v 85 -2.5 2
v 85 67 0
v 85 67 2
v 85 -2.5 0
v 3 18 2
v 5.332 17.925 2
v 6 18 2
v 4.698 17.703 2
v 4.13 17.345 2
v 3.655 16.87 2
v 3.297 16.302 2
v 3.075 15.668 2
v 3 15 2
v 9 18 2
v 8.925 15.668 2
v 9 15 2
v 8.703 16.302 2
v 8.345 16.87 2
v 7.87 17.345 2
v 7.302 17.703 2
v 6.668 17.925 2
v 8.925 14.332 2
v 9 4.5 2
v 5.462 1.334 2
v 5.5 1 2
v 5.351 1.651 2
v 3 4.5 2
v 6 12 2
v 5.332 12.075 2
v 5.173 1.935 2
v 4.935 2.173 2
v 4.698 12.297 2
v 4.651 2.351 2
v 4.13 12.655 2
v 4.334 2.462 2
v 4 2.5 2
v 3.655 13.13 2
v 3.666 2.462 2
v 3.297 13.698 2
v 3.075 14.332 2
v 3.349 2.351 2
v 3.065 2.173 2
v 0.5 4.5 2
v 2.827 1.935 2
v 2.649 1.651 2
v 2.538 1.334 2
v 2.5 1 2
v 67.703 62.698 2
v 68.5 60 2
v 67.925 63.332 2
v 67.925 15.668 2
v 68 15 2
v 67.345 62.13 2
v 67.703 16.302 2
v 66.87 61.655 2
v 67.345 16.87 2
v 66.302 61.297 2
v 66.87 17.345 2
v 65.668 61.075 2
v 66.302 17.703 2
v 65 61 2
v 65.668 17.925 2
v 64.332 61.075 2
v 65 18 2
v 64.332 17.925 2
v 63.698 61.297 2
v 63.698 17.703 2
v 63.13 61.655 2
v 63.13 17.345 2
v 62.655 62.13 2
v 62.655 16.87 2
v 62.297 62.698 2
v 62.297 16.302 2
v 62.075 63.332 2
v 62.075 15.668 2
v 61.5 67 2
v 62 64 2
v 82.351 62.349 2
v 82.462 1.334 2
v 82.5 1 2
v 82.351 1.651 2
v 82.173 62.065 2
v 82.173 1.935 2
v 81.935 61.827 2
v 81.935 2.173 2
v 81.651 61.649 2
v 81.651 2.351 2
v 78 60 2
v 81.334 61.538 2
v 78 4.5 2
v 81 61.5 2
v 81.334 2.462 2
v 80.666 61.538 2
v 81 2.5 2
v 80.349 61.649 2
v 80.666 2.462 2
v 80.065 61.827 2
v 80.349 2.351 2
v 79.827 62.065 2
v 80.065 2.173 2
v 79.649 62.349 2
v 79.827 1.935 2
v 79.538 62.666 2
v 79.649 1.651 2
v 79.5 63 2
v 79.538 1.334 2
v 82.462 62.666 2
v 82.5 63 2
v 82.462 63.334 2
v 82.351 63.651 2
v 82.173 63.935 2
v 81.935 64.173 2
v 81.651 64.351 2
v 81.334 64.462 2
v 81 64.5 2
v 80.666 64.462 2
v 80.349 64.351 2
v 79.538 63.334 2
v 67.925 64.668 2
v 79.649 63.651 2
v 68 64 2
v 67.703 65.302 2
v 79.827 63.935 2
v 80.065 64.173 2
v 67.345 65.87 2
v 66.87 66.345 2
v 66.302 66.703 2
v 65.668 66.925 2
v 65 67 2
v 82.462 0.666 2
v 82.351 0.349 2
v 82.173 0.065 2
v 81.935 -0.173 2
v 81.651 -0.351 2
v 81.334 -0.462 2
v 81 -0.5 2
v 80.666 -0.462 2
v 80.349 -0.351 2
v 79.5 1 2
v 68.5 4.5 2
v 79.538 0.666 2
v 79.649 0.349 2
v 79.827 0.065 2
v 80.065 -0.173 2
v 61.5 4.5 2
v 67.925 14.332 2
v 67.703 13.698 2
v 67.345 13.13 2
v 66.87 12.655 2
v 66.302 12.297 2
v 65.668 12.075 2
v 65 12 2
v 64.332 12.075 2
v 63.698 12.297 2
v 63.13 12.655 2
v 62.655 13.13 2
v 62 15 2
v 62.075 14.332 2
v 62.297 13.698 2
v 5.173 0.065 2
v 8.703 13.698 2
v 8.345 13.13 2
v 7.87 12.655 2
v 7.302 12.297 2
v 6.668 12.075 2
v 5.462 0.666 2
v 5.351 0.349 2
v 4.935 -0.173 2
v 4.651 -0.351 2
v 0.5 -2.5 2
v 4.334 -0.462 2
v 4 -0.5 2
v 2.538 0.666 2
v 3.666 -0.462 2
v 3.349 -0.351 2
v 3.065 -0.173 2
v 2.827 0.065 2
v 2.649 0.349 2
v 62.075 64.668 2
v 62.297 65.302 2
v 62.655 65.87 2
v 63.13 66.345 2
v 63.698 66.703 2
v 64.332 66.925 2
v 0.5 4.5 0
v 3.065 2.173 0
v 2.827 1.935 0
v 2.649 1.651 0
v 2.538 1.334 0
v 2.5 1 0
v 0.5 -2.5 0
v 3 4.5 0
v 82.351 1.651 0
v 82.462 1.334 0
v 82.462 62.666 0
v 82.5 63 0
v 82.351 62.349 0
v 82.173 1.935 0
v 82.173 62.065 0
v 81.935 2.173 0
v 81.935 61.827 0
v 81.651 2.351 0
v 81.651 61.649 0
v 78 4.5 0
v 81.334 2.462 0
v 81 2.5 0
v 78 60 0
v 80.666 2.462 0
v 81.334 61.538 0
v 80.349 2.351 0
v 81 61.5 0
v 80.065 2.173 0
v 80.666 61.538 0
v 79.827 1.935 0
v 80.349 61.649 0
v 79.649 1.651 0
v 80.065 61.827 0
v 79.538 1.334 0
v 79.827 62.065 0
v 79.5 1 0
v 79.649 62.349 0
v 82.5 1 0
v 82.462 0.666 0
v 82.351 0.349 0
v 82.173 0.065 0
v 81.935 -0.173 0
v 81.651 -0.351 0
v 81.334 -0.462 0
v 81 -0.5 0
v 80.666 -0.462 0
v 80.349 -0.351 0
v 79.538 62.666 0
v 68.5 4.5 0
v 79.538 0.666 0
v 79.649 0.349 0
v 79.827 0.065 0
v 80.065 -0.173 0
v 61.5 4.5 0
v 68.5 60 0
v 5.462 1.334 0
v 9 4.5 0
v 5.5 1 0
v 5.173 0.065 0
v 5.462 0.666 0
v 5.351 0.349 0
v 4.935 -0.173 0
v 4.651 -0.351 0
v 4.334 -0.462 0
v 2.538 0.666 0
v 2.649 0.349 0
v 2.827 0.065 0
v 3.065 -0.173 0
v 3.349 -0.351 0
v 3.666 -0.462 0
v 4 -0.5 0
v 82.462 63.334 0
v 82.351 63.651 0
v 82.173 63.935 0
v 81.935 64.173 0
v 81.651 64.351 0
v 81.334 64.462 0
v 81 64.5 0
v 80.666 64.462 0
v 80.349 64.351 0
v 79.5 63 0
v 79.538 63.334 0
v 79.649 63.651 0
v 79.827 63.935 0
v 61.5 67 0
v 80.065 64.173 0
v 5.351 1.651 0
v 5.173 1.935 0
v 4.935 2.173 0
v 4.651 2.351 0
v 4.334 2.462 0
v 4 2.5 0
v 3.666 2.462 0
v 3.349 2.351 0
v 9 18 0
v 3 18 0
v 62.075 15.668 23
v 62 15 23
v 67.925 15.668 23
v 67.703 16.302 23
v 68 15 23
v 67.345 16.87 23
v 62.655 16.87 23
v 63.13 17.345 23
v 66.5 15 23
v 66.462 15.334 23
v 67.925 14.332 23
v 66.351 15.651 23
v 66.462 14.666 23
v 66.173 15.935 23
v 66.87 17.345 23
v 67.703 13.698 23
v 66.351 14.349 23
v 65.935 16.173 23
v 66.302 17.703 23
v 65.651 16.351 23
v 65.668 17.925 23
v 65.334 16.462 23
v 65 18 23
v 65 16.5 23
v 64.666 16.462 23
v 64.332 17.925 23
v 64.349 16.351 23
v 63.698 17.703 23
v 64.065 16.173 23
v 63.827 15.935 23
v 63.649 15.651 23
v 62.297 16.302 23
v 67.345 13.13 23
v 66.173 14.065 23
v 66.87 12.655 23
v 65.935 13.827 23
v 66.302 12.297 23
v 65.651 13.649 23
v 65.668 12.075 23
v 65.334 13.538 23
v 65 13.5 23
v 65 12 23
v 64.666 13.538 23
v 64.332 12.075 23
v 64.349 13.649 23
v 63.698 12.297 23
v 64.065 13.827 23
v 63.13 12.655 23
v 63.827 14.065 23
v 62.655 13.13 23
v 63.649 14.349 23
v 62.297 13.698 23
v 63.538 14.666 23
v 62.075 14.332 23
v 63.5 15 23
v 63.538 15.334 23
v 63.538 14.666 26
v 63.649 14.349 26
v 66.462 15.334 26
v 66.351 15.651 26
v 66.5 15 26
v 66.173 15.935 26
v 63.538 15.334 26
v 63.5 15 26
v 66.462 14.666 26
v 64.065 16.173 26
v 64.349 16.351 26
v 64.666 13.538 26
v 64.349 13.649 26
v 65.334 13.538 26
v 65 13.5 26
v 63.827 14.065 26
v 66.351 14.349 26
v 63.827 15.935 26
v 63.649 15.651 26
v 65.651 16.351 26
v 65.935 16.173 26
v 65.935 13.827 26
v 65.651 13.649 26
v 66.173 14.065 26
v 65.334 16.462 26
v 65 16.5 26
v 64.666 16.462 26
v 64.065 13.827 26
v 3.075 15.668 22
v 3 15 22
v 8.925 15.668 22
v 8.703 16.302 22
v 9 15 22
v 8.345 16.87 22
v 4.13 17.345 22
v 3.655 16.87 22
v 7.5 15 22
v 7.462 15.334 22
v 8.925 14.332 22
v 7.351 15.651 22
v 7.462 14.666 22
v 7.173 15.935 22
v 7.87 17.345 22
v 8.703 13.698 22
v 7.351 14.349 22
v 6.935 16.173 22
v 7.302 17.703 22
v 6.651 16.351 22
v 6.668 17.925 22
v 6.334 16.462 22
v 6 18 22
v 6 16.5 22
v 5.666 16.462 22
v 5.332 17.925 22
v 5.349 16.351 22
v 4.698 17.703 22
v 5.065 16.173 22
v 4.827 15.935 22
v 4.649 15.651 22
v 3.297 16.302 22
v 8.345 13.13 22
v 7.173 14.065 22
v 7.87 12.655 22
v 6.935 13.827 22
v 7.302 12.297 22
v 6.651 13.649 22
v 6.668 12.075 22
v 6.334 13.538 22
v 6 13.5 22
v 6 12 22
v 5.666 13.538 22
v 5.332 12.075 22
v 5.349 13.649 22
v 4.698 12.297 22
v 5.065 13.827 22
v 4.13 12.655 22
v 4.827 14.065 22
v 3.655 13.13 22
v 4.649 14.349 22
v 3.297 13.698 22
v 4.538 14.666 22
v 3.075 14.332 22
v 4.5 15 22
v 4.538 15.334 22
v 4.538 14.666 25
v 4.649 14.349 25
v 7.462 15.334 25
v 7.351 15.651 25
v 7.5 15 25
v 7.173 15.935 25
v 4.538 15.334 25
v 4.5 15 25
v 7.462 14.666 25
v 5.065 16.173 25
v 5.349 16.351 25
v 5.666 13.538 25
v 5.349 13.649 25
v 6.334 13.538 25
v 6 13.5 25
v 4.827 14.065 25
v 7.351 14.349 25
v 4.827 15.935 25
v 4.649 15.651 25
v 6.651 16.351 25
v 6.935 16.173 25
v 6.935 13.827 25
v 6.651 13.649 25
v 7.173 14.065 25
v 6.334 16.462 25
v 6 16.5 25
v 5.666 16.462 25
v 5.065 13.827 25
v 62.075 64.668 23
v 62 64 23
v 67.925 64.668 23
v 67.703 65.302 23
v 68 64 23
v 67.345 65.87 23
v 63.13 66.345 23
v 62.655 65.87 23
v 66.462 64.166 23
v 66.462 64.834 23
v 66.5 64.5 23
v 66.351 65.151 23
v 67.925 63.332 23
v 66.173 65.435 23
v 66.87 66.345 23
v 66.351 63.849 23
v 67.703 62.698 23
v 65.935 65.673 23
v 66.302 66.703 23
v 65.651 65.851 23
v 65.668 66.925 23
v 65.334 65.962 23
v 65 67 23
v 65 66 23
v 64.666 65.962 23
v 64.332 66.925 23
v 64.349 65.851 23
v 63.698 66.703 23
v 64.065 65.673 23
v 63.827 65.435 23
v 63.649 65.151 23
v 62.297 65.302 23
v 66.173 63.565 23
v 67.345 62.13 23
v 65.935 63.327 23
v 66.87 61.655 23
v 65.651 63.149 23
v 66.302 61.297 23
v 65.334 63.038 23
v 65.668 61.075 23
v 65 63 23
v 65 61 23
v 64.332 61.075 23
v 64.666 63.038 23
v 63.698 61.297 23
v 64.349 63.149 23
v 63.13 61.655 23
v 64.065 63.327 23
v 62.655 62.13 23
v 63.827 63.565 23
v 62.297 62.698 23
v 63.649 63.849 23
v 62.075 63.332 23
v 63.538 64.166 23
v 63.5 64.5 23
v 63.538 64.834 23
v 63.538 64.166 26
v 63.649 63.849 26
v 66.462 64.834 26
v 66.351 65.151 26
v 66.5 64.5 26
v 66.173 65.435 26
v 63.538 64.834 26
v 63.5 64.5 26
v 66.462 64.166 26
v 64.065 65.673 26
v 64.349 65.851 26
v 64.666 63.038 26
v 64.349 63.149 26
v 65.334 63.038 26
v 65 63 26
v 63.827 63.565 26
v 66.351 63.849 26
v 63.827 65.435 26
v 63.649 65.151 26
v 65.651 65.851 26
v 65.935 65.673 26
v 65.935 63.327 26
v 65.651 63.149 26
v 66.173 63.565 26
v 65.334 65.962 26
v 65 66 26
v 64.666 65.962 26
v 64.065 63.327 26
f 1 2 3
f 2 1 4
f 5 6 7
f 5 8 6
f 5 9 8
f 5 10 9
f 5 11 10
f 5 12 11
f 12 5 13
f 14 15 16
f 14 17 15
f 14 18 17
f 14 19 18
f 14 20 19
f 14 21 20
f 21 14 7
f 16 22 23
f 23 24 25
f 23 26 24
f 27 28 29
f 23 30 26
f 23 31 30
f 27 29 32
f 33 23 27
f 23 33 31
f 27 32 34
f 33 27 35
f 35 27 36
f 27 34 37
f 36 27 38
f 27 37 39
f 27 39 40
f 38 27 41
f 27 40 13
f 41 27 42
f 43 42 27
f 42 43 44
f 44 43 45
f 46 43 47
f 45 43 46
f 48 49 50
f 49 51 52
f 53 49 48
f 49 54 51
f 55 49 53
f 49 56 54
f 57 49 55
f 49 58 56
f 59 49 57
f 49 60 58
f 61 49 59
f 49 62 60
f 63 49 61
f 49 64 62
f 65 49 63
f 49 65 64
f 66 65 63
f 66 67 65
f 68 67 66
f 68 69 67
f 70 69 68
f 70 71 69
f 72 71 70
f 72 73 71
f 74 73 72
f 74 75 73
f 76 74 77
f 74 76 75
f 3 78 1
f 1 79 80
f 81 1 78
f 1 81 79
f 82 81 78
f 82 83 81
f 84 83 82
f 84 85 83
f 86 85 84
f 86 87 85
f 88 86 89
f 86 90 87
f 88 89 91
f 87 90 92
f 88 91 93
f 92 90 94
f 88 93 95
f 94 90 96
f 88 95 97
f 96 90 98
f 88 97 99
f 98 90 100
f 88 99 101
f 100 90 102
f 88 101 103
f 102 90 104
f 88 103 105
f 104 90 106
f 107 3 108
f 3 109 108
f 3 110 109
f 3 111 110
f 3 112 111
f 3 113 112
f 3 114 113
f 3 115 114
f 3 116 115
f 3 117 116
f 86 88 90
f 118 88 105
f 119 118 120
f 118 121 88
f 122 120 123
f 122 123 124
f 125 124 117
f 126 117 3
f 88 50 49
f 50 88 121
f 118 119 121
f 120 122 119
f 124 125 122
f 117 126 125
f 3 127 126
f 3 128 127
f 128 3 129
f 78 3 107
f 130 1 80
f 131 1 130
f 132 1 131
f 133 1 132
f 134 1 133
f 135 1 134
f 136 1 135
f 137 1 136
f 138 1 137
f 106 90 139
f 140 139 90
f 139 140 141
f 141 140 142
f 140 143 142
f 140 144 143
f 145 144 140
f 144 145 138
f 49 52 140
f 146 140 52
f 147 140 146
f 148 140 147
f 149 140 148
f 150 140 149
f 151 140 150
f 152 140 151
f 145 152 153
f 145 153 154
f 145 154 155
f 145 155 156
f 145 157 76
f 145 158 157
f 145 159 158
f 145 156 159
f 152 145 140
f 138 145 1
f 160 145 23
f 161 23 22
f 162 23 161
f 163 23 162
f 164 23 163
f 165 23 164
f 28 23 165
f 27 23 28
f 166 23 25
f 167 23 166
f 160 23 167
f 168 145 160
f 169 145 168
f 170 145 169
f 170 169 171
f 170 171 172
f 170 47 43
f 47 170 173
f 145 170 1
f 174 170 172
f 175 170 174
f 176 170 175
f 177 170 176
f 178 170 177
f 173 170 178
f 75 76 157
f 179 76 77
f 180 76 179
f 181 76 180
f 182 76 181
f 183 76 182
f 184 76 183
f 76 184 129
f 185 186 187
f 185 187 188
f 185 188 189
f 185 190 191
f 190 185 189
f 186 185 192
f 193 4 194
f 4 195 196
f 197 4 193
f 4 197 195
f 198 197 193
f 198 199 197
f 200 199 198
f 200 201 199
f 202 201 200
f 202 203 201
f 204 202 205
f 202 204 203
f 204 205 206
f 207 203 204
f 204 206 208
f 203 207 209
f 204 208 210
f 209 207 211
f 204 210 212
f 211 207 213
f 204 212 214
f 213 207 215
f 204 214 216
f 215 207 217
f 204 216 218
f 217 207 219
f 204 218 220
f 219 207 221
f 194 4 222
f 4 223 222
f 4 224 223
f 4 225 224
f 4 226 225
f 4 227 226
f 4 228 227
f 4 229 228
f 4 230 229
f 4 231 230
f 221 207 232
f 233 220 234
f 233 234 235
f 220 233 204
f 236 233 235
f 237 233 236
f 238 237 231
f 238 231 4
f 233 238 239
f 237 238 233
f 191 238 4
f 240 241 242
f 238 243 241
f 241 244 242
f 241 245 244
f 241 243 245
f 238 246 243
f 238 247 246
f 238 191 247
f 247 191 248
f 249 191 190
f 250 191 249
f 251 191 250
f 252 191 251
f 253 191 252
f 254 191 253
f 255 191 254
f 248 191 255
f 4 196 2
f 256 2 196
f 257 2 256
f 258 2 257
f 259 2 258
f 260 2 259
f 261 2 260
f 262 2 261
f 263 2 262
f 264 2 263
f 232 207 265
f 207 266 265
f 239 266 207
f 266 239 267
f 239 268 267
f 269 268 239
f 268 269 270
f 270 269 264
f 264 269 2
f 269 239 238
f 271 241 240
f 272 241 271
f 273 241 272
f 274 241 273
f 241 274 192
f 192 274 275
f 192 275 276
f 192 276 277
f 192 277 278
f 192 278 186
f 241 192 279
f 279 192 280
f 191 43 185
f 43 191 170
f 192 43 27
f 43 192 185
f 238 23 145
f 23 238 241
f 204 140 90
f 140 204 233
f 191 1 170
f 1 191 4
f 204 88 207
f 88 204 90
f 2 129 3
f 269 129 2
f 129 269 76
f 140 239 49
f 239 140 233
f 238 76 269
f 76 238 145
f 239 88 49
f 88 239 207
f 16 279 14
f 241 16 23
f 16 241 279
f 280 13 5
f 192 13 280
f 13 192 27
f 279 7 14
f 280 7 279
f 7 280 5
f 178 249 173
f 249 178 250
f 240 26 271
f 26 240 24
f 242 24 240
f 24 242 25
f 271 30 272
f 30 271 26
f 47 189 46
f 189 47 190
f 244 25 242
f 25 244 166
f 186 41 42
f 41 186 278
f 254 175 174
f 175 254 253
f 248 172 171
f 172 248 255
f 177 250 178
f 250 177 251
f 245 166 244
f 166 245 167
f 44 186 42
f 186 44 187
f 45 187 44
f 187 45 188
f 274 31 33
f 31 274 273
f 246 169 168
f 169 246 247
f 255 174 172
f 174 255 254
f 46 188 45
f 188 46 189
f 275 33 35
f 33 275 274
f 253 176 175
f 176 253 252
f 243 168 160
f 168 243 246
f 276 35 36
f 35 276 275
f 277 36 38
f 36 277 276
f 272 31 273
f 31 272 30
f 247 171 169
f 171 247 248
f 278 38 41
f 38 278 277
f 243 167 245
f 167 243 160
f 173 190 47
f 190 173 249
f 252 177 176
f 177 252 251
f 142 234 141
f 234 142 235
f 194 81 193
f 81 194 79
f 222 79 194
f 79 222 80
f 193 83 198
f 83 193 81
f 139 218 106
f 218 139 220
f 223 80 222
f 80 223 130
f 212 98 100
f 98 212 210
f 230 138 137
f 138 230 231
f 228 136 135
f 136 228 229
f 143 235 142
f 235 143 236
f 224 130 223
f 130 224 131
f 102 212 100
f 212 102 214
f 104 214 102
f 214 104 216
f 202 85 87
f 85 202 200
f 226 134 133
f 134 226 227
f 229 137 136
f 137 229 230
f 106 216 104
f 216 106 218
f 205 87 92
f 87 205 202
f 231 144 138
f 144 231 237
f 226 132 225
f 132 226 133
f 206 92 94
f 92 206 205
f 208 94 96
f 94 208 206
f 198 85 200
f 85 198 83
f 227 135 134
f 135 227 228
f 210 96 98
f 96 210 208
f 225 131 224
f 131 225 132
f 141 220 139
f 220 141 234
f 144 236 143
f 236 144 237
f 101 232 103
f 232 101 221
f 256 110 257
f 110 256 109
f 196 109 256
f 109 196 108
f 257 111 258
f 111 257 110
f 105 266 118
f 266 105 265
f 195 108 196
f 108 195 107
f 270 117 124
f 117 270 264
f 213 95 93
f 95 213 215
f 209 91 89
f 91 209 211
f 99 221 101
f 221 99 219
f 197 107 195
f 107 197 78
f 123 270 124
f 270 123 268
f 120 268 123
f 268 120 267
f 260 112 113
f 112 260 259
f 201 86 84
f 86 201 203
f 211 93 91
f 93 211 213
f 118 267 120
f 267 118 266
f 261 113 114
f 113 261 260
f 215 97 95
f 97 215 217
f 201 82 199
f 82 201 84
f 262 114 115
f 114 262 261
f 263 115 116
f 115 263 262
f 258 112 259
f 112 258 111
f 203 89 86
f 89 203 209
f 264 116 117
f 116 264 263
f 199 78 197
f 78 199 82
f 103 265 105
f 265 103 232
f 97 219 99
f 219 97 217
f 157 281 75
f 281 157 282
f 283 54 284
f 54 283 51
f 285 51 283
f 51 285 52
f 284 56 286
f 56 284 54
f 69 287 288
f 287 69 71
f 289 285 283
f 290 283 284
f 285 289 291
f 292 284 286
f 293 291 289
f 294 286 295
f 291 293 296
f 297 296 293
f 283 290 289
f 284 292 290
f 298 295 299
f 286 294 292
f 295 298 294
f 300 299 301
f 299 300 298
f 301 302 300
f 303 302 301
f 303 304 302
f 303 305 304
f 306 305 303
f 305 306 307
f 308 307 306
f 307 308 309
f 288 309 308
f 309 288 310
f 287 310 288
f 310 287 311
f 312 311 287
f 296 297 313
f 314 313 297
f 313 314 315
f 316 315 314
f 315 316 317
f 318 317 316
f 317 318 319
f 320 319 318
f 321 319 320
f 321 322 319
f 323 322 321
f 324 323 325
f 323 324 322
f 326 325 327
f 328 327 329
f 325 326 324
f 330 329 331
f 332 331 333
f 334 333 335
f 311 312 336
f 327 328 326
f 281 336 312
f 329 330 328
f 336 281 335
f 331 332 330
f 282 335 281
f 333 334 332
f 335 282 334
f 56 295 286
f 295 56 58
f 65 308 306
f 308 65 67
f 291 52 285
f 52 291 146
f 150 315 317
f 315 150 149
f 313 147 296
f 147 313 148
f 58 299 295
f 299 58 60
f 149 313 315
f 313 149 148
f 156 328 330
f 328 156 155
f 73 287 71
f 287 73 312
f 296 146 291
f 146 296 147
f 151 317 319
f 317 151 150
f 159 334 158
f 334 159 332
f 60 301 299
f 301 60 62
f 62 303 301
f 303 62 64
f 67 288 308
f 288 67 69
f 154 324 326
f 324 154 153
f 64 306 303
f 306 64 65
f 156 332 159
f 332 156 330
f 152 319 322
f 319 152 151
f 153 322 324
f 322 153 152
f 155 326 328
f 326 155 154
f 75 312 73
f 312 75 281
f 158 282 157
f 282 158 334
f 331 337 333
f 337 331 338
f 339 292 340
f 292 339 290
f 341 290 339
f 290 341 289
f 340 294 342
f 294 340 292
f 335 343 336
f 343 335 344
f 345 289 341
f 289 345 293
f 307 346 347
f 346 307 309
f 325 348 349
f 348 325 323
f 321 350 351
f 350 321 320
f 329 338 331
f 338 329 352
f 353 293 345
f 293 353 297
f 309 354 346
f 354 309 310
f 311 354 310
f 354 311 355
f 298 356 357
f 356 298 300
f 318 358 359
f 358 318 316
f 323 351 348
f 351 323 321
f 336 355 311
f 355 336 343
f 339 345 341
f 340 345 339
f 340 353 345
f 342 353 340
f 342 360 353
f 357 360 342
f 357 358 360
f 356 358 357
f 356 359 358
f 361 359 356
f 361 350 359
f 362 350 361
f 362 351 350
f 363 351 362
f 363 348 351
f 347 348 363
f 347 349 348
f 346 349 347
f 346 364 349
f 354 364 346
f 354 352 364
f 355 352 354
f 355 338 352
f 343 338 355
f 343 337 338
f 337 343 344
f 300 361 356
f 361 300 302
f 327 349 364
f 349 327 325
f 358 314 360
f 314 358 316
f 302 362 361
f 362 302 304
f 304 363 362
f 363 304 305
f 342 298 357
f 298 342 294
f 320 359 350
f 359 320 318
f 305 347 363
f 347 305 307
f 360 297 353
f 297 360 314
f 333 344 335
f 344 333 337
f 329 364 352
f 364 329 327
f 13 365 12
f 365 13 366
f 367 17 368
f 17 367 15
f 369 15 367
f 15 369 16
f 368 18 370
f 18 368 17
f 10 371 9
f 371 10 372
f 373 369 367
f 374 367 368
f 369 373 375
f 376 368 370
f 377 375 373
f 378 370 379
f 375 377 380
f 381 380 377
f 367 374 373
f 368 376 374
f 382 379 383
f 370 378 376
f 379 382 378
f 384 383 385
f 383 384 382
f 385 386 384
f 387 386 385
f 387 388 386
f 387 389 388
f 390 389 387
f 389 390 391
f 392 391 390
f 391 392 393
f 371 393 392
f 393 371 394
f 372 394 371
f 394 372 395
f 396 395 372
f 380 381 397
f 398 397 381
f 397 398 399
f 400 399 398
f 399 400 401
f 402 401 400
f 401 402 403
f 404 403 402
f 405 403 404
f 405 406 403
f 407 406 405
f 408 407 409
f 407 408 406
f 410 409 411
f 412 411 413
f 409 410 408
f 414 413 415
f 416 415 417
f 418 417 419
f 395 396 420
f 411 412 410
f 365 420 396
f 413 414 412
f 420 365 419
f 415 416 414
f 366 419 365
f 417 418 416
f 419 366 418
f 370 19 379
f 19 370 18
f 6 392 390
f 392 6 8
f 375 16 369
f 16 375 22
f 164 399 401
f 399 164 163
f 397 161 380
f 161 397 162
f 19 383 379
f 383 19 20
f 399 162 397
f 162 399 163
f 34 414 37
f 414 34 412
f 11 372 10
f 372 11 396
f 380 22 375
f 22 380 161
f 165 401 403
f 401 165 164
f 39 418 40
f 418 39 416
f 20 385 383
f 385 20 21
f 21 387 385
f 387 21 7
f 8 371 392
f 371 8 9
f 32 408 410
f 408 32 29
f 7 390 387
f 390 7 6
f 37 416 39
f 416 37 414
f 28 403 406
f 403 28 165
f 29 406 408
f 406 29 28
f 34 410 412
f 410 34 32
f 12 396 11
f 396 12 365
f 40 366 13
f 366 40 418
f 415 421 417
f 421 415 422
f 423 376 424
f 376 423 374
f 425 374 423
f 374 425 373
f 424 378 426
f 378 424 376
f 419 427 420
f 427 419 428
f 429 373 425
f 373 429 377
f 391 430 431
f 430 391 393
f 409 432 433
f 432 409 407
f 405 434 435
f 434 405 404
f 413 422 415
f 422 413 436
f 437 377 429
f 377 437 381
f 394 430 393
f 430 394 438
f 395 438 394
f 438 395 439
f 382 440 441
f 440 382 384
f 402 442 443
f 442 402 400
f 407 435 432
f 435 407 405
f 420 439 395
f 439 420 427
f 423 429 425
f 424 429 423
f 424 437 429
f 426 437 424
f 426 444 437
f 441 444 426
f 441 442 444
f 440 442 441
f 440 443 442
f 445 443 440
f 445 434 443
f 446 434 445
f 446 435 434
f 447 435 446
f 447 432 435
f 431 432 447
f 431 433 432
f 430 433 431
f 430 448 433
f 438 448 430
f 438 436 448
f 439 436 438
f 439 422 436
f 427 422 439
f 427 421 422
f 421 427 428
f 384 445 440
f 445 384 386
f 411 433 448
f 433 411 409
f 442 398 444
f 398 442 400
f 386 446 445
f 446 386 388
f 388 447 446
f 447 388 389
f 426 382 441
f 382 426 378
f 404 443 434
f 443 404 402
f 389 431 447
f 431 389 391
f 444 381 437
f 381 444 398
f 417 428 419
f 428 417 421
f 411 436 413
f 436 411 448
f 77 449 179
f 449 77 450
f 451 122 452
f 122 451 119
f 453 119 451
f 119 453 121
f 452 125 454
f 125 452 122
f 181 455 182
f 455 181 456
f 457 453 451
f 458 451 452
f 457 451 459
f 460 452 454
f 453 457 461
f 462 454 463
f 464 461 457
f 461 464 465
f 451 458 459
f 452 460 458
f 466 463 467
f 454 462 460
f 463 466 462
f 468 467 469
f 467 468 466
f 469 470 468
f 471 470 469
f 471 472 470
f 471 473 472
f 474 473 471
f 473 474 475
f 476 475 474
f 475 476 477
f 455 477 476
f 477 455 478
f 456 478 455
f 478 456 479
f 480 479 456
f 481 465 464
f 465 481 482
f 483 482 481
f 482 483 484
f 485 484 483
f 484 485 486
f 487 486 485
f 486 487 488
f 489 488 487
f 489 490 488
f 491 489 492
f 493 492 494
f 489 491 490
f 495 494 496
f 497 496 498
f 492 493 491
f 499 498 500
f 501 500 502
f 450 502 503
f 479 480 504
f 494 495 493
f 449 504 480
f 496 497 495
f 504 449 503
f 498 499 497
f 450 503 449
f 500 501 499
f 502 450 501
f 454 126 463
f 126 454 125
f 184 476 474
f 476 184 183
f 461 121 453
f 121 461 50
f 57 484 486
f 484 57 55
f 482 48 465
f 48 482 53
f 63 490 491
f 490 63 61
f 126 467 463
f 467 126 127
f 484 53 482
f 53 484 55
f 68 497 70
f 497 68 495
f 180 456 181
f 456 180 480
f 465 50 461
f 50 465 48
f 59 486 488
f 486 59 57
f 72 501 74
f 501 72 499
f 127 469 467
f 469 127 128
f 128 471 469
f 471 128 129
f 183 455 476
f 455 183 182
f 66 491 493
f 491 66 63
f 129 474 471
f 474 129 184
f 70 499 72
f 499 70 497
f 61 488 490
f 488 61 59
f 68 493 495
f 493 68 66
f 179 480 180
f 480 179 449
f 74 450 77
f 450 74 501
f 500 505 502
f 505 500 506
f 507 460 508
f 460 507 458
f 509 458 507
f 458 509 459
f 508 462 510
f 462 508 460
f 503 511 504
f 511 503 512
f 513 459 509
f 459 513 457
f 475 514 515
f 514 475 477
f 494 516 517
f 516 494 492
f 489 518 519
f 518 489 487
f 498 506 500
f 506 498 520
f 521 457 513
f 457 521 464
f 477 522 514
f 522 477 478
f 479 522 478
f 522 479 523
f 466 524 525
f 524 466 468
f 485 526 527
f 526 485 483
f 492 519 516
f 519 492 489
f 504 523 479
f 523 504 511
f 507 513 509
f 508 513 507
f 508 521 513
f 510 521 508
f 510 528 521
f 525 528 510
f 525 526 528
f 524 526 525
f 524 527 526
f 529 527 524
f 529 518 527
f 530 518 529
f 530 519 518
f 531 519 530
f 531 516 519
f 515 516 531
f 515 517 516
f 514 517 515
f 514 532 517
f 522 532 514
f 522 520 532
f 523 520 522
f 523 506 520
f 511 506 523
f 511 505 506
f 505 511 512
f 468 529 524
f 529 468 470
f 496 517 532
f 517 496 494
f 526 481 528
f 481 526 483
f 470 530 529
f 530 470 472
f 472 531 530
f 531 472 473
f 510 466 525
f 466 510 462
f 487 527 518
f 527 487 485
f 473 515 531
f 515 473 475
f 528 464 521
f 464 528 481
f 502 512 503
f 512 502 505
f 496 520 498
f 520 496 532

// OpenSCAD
//number of fragments
$fn=28;

difference(){
    union(){
        translate([0.5,-2.5,0]){
            cube([84.50,7,2]);
        }
        translate([78,0,0]){
            cube([7,67,2]);
        }
        translate([61.5,0,0]){
            cube([7,67,2]);
        }
        translate([62,60,0]){
            cube([22,7,2]);
        }
        translate([3,0,0]){
            cube([6,18,2]);
        }
    }
    
    translate([4,1,-1]){
        cylinder(h=4,r=1.5);
    }
    translate([81,1,-1]){
        cylinder(h=4,r=1.5);
    }
    translate([81,63,-1]){
        cylinder(h=4,r=1.5);
    }
}

//front bottom
translate([65,15,0]){
    cylinder(h=23,r=3);
}
translate([65,15,0]){
    cylinder(h=26,r=1.5);
}

//back bottom
translate([6,15,0]){
    cylinder(h=22,r=3);
}
translate([6,15,0]){
    cylinder(h=25,r=1.5);
}

//front top
translate([65,64,0]){
    cylinder(h=23,r=3);
}
translate([65,64.5,0]){
    cylinder(h=26,r=1.5);
}
